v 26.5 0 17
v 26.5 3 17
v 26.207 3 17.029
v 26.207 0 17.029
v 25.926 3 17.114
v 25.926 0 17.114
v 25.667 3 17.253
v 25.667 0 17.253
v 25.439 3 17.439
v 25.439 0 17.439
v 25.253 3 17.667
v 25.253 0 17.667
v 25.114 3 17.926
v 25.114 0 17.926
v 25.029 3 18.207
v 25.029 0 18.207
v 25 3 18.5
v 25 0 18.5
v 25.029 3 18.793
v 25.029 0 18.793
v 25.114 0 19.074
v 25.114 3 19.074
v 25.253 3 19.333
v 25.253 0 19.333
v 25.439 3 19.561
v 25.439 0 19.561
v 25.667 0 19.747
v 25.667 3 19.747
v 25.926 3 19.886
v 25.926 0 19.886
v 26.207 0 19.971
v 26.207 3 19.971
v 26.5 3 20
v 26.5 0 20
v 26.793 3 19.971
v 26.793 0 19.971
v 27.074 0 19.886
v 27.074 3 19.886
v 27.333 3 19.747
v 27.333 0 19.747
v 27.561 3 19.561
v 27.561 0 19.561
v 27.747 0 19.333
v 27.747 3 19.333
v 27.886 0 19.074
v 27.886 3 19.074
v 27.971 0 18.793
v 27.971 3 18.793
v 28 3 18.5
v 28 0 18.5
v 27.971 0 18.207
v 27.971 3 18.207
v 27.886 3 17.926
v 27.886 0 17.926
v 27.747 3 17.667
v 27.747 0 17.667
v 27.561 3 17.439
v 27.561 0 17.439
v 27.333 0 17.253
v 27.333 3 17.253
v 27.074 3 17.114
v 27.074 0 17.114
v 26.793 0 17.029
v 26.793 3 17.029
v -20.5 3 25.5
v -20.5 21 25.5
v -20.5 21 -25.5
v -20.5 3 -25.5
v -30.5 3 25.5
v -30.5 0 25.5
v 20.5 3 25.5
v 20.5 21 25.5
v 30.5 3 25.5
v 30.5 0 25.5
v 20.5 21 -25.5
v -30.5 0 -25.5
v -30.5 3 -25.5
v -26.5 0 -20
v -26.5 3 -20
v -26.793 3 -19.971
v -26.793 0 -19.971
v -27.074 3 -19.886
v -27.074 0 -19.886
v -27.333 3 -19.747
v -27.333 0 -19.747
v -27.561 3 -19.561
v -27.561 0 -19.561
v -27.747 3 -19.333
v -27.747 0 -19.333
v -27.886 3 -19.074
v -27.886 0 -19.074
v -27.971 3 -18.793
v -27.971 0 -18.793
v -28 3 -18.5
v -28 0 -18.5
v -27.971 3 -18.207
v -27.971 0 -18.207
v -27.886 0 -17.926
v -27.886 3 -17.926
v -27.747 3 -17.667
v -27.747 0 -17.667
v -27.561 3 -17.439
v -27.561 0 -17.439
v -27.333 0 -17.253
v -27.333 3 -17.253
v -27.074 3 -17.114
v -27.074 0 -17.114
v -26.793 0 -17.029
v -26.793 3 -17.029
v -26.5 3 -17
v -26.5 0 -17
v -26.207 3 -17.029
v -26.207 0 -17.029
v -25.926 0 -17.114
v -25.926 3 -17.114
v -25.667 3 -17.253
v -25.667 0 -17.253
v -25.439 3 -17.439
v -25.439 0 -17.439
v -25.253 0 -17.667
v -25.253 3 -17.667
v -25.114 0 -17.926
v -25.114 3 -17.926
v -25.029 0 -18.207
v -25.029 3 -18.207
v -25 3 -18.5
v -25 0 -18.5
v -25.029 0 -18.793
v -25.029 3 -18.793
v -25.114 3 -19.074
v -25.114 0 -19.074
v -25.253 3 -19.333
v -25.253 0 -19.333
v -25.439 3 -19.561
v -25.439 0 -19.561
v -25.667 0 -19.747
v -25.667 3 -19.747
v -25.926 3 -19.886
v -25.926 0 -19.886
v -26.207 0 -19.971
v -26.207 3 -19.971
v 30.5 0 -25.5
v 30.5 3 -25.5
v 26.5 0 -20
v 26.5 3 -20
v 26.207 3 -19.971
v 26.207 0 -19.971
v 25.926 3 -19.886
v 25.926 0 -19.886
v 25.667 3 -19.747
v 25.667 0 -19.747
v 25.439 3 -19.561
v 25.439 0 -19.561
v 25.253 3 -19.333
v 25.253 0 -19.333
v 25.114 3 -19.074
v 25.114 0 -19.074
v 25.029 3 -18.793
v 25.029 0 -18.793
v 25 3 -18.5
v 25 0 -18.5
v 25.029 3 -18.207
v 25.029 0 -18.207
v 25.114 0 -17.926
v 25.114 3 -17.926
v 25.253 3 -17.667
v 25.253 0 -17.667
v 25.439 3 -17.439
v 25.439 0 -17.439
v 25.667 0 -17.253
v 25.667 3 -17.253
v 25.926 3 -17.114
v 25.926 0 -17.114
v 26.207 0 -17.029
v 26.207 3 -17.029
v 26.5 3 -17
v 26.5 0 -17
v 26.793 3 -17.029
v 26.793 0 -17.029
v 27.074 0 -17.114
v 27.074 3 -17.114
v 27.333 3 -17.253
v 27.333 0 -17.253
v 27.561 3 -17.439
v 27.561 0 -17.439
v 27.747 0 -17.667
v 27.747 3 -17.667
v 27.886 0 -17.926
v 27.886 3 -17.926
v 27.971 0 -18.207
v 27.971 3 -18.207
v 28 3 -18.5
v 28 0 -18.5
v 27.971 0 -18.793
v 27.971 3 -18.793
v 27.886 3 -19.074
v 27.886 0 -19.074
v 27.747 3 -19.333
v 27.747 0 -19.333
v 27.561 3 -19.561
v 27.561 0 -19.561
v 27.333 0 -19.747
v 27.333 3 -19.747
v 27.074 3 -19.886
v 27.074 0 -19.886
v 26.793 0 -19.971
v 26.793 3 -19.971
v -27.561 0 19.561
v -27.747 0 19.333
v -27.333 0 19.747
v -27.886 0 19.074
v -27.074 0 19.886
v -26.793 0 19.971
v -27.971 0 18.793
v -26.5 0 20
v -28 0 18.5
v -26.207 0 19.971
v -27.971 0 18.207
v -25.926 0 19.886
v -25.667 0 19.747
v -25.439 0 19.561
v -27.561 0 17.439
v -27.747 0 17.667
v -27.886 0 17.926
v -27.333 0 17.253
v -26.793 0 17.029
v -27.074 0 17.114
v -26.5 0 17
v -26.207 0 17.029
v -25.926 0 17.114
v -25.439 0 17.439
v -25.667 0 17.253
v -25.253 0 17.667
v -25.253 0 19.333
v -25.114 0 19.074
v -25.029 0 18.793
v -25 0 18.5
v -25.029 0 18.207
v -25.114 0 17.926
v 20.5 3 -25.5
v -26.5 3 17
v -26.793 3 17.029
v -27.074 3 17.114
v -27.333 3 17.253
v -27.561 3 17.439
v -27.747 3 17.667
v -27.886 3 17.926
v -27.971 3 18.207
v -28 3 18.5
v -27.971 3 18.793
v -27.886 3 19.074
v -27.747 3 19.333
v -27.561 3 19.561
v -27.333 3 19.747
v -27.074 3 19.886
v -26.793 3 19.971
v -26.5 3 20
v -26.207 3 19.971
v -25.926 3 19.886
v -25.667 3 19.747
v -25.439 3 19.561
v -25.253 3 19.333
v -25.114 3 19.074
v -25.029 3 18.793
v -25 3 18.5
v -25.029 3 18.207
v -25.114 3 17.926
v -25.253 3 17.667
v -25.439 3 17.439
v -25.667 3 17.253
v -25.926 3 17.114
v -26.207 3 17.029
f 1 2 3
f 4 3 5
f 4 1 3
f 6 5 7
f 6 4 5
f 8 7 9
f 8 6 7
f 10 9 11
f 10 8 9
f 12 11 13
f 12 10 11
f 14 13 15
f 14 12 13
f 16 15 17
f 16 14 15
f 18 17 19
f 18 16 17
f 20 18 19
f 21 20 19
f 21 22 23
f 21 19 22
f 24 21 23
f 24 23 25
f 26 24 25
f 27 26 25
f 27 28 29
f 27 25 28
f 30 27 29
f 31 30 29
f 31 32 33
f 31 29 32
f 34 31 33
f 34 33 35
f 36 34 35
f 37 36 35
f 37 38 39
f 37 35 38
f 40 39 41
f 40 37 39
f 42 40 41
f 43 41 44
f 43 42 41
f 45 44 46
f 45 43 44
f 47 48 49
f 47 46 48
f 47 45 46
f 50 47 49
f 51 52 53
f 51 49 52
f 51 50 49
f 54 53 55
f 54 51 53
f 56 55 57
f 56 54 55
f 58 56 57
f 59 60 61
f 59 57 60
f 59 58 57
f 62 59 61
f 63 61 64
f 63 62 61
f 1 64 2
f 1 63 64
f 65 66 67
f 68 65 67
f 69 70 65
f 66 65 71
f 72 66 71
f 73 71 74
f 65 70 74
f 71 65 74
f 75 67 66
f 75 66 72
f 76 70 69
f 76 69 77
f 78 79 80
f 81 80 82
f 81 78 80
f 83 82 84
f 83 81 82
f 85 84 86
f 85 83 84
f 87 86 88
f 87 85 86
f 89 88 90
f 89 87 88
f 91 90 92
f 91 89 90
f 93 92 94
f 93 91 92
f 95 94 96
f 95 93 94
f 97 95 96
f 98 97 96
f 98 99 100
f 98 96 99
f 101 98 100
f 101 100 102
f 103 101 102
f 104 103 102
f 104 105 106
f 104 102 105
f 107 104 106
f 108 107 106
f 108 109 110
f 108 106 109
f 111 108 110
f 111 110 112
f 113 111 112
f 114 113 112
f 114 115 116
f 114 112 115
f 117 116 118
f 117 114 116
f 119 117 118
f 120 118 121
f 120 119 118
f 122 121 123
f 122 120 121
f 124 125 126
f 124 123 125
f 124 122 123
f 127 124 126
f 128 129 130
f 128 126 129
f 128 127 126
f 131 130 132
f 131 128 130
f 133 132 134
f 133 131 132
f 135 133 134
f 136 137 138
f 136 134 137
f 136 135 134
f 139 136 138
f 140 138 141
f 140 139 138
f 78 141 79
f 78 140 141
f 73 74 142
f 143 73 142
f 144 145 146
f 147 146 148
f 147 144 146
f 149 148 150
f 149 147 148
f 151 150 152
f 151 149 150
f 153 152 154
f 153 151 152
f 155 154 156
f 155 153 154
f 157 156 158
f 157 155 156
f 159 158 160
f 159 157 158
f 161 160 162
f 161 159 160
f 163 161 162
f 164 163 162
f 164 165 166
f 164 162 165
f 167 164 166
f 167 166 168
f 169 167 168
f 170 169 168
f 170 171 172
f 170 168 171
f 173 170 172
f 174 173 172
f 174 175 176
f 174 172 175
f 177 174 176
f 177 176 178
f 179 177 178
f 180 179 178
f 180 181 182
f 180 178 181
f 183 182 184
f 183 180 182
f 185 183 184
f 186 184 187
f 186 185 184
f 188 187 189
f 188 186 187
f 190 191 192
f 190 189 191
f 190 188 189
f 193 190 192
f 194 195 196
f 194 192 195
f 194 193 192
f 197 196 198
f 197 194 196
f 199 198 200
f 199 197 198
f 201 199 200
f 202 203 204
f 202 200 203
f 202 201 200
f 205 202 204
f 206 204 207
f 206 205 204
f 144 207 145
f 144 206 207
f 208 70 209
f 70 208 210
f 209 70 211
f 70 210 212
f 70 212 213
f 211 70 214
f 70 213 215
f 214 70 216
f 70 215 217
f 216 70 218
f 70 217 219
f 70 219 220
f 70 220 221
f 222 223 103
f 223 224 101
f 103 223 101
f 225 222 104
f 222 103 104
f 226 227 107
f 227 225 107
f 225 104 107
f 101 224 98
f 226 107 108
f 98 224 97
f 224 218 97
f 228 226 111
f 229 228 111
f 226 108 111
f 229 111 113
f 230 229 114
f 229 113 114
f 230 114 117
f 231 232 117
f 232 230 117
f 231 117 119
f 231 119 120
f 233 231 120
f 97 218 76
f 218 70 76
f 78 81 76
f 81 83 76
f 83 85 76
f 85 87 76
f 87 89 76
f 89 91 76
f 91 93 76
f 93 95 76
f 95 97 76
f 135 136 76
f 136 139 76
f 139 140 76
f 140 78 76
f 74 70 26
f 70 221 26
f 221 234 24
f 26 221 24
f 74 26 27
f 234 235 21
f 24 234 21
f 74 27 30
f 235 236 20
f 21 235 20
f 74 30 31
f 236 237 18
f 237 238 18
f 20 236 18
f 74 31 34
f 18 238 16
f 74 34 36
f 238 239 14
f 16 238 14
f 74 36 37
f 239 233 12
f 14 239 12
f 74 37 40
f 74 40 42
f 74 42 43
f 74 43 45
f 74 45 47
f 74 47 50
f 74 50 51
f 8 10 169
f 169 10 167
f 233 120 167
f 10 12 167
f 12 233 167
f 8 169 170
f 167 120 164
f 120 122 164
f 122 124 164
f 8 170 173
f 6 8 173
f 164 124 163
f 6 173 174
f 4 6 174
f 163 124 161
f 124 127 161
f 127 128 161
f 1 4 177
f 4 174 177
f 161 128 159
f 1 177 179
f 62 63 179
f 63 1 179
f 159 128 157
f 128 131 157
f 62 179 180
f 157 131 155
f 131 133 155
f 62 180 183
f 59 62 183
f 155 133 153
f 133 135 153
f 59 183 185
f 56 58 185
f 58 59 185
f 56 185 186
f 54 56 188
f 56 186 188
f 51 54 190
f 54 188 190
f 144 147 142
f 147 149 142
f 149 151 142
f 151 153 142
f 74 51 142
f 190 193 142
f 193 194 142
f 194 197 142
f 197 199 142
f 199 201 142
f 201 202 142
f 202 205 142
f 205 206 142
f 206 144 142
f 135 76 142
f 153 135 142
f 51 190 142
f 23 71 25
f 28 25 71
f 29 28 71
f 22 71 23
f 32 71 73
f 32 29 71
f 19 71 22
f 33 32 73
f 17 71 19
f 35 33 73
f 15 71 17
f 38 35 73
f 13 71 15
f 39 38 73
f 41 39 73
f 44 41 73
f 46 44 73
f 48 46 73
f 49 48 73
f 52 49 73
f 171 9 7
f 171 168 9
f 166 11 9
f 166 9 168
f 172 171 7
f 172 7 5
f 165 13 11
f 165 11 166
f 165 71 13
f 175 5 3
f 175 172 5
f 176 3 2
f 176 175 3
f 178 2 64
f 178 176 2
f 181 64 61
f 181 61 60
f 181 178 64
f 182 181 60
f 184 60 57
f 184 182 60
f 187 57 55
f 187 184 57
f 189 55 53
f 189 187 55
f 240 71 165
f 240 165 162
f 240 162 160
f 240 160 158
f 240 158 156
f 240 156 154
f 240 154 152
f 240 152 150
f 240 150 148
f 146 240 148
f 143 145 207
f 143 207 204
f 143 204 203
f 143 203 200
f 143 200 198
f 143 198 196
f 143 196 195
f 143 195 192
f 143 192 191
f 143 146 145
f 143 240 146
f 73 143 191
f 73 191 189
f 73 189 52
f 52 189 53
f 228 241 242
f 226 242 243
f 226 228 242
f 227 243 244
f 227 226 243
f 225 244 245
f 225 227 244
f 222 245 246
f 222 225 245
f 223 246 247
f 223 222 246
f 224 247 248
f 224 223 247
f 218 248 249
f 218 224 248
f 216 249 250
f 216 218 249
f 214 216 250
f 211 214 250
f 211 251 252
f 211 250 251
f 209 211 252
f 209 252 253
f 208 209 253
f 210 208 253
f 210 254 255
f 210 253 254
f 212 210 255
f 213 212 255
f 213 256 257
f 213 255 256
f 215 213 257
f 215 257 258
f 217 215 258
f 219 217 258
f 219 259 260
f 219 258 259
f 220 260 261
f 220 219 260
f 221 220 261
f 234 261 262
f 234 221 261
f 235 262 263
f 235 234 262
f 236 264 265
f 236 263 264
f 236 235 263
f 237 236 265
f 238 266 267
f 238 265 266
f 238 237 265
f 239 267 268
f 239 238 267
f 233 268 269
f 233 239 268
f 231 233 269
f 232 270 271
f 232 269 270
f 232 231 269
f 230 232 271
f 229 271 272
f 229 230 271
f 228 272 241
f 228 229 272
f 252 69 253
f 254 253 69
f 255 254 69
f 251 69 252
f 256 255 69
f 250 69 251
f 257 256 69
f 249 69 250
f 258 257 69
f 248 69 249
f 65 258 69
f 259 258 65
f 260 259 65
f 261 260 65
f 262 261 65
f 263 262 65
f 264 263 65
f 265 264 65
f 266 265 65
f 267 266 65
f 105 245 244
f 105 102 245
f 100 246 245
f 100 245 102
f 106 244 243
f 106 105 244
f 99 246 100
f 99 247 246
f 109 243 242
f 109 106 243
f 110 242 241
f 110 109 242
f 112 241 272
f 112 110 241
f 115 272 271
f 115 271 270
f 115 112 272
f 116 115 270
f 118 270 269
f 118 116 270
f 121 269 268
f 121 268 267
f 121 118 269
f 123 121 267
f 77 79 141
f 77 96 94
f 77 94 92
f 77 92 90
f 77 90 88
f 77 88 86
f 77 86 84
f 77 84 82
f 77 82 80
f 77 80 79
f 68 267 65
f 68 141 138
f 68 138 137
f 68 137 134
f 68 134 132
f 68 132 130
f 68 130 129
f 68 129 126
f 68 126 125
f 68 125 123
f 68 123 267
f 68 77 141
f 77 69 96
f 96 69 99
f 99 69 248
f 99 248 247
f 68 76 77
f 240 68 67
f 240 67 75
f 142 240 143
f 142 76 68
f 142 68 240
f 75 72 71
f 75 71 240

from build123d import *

# Parameters (mm, degrees)
ESBO_O1_W                = 61
ESBO_O1_H                = 51
ESBO_O1_R                = 1.5
RESSALTO_EXTRUS_O1_DEPTH = 21
ESBO_O2_W                = 10
ESBO_O2_H                = 51
CORTE_EXTRUS_O1_DEPTH    = 18


with BuildPart() as part:
    # Esboço1 → Ressalto-extrusão1 (new body)
    with BuildSketch(Plane(origin=(0, 0, 0), x_dir=(1, 0, 0), z_dir=(0, 1, 0))):
        Rectangle(ESBO_O1_W, ESBO_O1_H)
        with Locations(Location((-26.5, 18.5, 0), (0, 0, 90))):
            Circle(ESBO_O1_R, mode=Mode.SUBTRACT)
        with Locations(Location((-26.5, -18.5, 0), (0, 0, 90))):
            Circle(ESBO_O1_R, mode=Mode.SUBTRACT)
        with Locations(Location((26.5, -18.5, 0), (0, 0, 90))):
            Circle(ESBO_O1_R, mode=Mode.SUBTRACT)
        with Locations(Location((26.5, 18.5, 0), (0, 0, 90))):
            Circle(ESBO_O1_R, mode=Mode.SUBTRACT)
    extrude(amount=RESSALTO_EXTRUS_O1_DEPTH)

    # Esboço2 → Corte-extrusão1 (cut)
    with BuildSketch(Plane(origin=(0, 21, 0), x_dir=(1, 0, 0), z_dir=(0, 1, 0))):
        with Locations((-25.5, 0)):
            Rectangle(ESBO_O2_W, ESBO_O2_H)
        with Locations((25.5, 0)):
            Rectangle(ESBO_O2_W, ESBO_O2_H)
    extrude(amount=-CORTE_EXTRUS_O1_DEPTH, mode=Mode.SUBTRACT)


solid = part.part
